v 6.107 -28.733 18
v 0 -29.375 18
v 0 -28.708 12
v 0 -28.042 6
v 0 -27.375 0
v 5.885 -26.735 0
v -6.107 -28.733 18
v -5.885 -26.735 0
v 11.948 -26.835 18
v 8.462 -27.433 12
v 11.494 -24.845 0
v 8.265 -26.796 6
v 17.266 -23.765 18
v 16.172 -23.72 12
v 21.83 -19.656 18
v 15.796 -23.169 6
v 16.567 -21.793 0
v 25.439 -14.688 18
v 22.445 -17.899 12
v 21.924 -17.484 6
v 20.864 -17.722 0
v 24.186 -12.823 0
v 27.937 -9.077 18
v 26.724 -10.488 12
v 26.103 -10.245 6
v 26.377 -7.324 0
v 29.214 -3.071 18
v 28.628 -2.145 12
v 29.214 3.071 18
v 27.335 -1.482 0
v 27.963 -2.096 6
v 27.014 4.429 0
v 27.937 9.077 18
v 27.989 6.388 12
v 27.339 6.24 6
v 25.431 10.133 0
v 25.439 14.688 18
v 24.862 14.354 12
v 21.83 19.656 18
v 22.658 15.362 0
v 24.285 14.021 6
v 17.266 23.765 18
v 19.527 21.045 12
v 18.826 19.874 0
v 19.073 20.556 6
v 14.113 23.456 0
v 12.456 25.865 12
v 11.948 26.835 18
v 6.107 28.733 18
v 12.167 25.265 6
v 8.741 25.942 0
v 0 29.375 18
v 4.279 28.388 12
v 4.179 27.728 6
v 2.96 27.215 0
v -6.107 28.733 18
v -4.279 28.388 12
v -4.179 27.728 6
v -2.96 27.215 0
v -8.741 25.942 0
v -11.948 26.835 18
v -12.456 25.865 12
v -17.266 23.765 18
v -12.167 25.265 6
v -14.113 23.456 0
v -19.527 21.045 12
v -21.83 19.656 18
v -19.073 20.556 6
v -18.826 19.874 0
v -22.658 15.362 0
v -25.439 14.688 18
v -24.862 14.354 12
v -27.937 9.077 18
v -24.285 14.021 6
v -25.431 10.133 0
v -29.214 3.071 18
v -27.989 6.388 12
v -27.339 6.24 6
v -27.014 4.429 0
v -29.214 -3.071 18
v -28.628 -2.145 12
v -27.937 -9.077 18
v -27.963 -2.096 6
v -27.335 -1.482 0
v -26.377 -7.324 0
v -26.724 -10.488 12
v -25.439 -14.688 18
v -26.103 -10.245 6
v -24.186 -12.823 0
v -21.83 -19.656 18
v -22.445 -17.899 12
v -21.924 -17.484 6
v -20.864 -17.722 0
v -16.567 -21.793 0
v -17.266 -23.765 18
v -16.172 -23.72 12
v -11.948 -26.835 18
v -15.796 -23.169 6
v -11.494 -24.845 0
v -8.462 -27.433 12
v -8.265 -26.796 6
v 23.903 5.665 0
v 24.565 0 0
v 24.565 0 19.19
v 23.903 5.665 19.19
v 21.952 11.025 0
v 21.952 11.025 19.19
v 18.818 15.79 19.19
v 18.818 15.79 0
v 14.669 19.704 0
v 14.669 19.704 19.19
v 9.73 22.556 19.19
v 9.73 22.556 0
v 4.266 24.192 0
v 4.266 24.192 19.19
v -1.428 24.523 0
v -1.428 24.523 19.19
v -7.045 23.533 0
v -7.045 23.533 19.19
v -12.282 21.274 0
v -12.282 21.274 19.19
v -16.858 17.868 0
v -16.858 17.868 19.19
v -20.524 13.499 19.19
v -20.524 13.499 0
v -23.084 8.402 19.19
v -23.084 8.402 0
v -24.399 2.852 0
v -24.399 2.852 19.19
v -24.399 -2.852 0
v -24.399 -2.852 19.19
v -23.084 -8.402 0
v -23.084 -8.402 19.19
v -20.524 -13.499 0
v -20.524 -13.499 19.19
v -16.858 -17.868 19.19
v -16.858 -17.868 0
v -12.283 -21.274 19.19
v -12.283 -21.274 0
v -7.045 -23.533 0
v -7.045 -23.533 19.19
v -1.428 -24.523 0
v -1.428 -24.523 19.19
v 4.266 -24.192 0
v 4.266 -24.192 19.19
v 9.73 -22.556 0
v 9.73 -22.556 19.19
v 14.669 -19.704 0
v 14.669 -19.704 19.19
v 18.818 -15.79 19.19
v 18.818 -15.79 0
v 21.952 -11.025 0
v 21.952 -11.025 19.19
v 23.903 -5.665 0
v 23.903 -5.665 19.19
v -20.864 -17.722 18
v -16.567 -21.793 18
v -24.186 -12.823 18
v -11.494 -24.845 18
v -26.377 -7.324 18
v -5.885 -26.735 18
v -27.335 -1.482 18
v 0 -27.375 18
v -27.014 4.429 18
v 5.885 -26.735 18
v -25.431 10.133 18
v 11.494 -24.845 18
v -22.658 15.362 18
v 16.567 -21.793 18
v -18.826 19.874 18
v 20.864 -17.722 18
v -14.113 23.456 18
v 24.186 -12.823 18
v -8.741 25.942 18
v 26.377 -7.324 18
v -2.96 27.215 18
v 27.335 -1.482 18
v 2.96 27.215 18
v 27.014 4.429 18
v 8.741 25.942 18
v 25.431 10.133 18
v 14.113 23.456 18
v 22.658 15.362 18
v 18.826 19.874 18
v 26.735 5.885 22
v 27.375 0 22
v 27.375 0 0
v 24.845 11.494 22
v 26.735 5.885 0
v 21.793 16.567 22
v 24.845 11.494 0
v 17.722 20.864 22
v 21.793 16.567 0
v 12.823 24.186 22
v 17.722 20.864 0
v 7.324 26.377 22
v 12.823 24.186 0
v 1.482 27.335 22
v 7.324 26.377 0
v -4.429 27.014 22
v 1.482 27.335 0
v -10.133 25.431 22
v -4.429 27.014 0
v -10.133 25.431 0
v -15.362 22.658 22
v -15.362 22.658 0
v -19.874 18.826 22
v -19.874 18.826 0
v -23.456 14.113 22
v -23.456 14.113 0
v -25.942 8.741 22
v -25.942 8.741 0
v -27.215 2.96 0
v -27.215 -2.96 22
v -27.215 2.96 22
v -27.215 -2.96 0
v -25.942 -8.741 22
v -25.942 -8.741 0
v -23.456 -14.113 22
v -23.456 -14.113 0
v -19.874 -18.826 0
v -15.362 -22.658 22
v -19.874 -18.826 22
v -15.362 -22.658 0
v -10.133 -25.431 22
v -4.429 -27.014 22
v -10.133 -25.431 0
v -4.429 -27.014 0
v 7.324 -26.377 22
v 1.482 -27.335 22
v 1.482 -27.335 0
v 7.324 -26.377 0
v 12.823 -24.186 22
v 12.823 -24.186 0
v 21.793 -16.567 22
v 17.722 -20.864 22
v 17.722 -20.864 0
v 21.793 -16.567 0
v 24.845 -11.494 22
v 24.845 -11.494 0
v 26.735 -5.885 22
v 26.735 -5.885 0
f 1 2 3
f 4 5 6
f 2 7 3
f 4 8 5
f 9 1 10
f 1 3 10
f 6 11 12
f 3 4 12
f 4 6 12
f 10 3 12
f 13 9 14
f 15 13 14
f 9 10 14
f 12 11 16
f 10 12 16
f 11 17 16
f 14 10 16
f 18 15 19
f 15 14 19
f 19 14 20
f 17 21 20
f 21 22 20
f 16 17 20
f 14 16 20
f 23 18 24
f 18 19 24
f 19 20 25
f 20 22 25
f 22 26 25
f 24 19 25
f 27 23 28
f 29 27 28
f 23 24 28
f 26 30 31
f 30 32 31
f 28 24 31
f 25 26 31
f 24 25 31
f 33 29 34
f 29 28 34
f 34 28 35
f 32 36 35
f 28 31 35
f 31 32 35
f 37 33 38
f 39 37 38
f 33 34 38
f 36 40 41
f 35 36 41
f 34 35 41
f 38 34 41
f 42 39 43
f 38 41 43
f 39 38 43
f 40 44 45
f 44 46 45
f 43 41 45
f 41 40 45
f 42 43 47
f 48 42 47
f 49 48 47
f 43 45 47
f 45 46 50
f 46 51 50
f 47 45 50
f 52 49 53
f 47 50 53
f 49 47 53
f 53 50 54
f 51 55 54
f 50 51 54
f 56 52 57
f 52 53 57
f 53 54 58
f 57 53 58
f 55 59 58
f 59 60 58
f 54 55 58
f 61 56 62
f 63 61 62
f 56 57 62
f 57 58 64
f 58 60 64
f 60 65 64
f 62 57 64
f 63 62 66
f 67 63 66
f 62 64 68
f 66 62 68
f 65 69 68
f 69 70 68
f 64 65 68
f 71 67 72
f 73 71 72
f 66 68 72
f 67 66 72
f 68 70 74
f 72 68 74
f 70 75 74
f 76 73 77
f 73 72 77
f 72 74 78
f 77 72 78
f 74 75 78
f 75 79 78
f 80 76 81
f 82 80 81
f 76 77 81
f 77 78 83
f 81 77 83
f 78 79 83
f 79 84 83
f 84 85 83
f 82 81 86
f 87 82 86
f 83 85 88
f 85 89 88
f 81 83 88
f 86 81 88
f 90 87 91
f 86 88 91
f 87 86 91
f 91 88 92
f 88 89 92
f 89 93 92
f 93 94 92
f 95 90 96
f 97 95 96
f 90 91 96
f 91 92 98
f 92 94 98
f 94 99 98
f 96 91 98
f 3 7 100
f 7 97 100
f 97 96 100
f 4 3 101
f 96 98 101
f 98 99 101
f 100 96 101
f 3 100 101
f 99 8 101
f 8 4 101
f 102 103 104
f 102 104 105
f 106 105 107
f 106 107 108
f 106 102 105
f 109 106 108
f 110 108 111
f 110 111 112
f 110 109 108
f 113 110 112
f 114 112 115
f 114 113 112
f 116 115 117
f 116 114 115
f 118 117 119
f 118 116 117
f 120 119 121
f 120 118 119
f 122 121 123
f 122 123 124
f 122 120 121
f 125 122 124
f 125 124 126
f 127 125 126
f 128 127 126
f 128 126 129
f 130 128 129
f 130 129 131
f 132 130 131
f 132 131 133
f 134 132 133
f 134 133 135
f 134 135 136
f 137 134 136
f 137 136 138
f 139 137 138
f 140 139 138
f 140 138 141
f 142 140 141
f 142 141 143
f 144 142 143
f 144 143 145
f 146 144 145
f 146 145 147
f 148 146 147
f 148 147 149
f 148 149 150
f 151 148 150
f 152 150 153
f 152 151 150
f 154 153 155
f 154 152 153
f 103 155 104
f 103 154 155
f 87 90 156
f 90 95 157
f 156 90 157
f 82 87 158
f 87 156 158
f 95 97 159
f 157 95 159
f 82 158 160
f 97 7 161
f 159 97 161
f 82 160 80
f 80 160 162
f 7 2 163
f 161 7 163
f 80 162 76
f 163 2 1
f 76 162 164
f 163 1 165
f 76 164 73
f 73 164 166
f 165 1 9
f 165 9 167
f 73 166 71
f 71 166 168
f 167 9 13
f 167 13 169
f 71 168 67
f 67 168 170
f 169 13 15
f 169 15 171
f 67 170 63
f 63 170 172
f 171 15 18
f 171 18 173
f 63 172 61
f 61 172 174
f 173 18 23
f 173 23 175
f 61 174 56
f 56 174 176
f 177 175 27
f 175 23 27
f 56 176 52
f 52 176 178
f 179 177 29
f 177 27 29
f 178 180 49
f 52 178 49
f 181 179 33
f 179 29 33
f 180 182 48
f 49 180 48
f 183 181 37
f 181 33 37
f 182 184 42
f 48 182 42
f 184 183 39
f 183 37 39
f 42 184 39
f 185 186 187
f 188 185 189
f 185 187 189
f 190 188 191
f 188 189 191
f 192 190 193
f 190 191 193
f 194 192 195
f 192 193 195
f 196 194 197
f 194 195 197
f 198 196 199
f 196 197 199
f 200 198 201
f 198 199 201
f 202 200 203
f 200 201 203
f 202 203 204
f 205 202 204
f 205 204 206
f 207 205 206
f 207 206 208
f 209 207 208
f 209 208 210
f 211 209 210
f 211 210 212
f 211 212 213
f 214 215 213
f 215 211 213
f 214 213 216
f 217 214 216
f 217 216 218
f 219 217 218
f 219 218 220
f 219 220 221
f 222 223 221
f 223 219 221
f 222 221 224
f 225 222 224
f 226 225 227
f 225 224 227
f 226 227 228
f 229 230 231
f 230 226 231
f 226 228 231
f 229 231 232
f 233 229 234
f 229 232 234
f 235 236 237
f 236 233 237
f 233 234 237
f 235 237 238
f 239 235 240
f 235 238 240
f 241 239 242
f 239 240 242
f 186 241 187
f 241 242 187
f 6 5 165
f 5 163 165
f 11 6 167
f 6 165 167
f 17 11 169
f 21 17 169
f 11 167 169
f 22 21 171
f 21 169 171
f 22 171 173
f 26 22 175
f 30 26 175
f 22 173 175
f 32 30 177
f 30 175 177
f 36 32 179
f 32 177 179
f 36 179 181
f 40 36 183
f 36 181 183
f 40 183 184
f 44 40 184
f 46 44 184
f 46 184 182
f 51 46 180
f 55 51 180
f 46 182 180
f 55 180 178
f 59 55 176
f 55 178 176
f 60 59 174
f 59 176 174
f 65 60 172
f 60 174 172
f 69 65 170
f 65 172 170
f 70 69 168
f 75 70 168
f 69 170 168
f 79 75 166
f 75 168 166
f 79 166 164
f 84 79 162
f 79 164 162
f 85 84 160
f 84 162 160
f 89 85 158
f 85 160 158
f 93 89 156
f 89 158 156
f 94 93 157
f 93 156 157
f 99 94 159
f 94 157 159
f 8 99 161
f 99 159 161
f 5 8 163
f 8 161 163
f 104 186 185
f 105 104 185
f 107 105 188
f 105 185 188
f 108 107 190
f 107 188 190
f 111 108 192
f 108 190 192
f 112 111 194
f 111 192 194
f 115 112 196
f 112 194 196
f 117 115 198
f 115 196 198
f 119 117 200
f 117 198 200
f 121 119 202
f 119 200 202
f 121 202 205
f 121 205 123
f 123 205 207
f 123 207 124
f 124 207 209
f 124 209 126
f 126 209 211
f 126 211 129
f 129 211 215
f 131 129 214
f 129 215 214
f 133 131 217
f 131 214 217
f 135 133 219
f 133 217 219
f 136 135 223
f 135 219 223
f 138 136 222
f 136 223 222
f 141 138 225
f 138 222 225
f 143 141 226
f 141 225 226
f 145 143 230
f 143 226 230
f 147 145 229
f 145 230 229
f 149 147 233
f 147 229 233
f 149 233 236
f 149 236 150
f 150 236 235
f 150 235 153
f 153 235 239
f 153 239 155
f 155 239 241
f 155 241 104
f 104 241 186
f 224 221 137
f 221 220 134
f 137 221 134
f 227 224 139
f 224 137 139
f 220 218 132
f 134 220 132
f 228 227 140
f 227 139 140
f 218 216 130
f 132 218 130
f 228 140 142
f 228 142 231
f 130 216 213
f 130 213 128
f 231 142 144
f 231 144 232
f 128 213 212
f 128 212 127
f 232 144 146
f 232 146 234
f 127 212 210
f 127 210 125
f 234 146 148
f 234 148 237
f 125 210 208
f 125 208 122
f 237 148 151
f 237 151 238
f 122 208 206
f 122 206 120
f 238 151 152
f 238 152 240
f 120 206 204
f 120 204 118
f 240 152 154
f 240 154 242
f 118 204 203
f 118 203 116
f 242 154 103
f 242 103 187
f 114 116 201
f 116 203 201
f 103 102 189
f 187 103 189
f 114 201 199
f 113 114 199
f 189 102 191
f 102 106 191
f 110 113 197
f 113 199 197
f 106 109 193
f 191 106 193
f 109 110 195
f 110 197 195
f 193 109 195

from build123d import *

# Parameters (mm, degrees)
F0_R     = 27.375
F0_R_2   = 24.565
F1_DEPTH = 22.09


# Not quite as in the source:
# - a fillet or chamfer that OpenCascade refuses, or shapes differently, is made with other operations: its cross-section is extruded or revolved along the edge and cut away or added


with BuildPart() as f1:
    # F0 (on Top) → F1 (new body)
    with BuildSketch(Plane.XY):
        Circle(F0_R)
        Circle(F0_R_2, mode=Mode.SUBTRACT)
    extrude(amount=F1_DEPTH)

    # F2: chamfer of 2.9 on 1 edges, made by hand

    # F2_s1 → F2_t2 (revolve, cut)
    with BuildSketch(Plane.XZ):
        Polygon((24.565, 19.19), (27.465, 22.09), (24.565, 22.09), align=None)
    revolve(axis=Axis((0, 0, 22.09), (0, 0, 1)), mode=Mode.SUBTRACT)


with BuildPart() as f5:
    # F3 (on Right) → F5 (revolve)
    with BuildSketch(Plane.YZ):
        Polygon((-29.375, 18), (-27.375, 0), (-27.375, 18), align=None)
    revolve(axis=Axis((0, 0, 7.8462371603), (0, 0, 1)))


solid = Compound([f1.part, f5.part])
